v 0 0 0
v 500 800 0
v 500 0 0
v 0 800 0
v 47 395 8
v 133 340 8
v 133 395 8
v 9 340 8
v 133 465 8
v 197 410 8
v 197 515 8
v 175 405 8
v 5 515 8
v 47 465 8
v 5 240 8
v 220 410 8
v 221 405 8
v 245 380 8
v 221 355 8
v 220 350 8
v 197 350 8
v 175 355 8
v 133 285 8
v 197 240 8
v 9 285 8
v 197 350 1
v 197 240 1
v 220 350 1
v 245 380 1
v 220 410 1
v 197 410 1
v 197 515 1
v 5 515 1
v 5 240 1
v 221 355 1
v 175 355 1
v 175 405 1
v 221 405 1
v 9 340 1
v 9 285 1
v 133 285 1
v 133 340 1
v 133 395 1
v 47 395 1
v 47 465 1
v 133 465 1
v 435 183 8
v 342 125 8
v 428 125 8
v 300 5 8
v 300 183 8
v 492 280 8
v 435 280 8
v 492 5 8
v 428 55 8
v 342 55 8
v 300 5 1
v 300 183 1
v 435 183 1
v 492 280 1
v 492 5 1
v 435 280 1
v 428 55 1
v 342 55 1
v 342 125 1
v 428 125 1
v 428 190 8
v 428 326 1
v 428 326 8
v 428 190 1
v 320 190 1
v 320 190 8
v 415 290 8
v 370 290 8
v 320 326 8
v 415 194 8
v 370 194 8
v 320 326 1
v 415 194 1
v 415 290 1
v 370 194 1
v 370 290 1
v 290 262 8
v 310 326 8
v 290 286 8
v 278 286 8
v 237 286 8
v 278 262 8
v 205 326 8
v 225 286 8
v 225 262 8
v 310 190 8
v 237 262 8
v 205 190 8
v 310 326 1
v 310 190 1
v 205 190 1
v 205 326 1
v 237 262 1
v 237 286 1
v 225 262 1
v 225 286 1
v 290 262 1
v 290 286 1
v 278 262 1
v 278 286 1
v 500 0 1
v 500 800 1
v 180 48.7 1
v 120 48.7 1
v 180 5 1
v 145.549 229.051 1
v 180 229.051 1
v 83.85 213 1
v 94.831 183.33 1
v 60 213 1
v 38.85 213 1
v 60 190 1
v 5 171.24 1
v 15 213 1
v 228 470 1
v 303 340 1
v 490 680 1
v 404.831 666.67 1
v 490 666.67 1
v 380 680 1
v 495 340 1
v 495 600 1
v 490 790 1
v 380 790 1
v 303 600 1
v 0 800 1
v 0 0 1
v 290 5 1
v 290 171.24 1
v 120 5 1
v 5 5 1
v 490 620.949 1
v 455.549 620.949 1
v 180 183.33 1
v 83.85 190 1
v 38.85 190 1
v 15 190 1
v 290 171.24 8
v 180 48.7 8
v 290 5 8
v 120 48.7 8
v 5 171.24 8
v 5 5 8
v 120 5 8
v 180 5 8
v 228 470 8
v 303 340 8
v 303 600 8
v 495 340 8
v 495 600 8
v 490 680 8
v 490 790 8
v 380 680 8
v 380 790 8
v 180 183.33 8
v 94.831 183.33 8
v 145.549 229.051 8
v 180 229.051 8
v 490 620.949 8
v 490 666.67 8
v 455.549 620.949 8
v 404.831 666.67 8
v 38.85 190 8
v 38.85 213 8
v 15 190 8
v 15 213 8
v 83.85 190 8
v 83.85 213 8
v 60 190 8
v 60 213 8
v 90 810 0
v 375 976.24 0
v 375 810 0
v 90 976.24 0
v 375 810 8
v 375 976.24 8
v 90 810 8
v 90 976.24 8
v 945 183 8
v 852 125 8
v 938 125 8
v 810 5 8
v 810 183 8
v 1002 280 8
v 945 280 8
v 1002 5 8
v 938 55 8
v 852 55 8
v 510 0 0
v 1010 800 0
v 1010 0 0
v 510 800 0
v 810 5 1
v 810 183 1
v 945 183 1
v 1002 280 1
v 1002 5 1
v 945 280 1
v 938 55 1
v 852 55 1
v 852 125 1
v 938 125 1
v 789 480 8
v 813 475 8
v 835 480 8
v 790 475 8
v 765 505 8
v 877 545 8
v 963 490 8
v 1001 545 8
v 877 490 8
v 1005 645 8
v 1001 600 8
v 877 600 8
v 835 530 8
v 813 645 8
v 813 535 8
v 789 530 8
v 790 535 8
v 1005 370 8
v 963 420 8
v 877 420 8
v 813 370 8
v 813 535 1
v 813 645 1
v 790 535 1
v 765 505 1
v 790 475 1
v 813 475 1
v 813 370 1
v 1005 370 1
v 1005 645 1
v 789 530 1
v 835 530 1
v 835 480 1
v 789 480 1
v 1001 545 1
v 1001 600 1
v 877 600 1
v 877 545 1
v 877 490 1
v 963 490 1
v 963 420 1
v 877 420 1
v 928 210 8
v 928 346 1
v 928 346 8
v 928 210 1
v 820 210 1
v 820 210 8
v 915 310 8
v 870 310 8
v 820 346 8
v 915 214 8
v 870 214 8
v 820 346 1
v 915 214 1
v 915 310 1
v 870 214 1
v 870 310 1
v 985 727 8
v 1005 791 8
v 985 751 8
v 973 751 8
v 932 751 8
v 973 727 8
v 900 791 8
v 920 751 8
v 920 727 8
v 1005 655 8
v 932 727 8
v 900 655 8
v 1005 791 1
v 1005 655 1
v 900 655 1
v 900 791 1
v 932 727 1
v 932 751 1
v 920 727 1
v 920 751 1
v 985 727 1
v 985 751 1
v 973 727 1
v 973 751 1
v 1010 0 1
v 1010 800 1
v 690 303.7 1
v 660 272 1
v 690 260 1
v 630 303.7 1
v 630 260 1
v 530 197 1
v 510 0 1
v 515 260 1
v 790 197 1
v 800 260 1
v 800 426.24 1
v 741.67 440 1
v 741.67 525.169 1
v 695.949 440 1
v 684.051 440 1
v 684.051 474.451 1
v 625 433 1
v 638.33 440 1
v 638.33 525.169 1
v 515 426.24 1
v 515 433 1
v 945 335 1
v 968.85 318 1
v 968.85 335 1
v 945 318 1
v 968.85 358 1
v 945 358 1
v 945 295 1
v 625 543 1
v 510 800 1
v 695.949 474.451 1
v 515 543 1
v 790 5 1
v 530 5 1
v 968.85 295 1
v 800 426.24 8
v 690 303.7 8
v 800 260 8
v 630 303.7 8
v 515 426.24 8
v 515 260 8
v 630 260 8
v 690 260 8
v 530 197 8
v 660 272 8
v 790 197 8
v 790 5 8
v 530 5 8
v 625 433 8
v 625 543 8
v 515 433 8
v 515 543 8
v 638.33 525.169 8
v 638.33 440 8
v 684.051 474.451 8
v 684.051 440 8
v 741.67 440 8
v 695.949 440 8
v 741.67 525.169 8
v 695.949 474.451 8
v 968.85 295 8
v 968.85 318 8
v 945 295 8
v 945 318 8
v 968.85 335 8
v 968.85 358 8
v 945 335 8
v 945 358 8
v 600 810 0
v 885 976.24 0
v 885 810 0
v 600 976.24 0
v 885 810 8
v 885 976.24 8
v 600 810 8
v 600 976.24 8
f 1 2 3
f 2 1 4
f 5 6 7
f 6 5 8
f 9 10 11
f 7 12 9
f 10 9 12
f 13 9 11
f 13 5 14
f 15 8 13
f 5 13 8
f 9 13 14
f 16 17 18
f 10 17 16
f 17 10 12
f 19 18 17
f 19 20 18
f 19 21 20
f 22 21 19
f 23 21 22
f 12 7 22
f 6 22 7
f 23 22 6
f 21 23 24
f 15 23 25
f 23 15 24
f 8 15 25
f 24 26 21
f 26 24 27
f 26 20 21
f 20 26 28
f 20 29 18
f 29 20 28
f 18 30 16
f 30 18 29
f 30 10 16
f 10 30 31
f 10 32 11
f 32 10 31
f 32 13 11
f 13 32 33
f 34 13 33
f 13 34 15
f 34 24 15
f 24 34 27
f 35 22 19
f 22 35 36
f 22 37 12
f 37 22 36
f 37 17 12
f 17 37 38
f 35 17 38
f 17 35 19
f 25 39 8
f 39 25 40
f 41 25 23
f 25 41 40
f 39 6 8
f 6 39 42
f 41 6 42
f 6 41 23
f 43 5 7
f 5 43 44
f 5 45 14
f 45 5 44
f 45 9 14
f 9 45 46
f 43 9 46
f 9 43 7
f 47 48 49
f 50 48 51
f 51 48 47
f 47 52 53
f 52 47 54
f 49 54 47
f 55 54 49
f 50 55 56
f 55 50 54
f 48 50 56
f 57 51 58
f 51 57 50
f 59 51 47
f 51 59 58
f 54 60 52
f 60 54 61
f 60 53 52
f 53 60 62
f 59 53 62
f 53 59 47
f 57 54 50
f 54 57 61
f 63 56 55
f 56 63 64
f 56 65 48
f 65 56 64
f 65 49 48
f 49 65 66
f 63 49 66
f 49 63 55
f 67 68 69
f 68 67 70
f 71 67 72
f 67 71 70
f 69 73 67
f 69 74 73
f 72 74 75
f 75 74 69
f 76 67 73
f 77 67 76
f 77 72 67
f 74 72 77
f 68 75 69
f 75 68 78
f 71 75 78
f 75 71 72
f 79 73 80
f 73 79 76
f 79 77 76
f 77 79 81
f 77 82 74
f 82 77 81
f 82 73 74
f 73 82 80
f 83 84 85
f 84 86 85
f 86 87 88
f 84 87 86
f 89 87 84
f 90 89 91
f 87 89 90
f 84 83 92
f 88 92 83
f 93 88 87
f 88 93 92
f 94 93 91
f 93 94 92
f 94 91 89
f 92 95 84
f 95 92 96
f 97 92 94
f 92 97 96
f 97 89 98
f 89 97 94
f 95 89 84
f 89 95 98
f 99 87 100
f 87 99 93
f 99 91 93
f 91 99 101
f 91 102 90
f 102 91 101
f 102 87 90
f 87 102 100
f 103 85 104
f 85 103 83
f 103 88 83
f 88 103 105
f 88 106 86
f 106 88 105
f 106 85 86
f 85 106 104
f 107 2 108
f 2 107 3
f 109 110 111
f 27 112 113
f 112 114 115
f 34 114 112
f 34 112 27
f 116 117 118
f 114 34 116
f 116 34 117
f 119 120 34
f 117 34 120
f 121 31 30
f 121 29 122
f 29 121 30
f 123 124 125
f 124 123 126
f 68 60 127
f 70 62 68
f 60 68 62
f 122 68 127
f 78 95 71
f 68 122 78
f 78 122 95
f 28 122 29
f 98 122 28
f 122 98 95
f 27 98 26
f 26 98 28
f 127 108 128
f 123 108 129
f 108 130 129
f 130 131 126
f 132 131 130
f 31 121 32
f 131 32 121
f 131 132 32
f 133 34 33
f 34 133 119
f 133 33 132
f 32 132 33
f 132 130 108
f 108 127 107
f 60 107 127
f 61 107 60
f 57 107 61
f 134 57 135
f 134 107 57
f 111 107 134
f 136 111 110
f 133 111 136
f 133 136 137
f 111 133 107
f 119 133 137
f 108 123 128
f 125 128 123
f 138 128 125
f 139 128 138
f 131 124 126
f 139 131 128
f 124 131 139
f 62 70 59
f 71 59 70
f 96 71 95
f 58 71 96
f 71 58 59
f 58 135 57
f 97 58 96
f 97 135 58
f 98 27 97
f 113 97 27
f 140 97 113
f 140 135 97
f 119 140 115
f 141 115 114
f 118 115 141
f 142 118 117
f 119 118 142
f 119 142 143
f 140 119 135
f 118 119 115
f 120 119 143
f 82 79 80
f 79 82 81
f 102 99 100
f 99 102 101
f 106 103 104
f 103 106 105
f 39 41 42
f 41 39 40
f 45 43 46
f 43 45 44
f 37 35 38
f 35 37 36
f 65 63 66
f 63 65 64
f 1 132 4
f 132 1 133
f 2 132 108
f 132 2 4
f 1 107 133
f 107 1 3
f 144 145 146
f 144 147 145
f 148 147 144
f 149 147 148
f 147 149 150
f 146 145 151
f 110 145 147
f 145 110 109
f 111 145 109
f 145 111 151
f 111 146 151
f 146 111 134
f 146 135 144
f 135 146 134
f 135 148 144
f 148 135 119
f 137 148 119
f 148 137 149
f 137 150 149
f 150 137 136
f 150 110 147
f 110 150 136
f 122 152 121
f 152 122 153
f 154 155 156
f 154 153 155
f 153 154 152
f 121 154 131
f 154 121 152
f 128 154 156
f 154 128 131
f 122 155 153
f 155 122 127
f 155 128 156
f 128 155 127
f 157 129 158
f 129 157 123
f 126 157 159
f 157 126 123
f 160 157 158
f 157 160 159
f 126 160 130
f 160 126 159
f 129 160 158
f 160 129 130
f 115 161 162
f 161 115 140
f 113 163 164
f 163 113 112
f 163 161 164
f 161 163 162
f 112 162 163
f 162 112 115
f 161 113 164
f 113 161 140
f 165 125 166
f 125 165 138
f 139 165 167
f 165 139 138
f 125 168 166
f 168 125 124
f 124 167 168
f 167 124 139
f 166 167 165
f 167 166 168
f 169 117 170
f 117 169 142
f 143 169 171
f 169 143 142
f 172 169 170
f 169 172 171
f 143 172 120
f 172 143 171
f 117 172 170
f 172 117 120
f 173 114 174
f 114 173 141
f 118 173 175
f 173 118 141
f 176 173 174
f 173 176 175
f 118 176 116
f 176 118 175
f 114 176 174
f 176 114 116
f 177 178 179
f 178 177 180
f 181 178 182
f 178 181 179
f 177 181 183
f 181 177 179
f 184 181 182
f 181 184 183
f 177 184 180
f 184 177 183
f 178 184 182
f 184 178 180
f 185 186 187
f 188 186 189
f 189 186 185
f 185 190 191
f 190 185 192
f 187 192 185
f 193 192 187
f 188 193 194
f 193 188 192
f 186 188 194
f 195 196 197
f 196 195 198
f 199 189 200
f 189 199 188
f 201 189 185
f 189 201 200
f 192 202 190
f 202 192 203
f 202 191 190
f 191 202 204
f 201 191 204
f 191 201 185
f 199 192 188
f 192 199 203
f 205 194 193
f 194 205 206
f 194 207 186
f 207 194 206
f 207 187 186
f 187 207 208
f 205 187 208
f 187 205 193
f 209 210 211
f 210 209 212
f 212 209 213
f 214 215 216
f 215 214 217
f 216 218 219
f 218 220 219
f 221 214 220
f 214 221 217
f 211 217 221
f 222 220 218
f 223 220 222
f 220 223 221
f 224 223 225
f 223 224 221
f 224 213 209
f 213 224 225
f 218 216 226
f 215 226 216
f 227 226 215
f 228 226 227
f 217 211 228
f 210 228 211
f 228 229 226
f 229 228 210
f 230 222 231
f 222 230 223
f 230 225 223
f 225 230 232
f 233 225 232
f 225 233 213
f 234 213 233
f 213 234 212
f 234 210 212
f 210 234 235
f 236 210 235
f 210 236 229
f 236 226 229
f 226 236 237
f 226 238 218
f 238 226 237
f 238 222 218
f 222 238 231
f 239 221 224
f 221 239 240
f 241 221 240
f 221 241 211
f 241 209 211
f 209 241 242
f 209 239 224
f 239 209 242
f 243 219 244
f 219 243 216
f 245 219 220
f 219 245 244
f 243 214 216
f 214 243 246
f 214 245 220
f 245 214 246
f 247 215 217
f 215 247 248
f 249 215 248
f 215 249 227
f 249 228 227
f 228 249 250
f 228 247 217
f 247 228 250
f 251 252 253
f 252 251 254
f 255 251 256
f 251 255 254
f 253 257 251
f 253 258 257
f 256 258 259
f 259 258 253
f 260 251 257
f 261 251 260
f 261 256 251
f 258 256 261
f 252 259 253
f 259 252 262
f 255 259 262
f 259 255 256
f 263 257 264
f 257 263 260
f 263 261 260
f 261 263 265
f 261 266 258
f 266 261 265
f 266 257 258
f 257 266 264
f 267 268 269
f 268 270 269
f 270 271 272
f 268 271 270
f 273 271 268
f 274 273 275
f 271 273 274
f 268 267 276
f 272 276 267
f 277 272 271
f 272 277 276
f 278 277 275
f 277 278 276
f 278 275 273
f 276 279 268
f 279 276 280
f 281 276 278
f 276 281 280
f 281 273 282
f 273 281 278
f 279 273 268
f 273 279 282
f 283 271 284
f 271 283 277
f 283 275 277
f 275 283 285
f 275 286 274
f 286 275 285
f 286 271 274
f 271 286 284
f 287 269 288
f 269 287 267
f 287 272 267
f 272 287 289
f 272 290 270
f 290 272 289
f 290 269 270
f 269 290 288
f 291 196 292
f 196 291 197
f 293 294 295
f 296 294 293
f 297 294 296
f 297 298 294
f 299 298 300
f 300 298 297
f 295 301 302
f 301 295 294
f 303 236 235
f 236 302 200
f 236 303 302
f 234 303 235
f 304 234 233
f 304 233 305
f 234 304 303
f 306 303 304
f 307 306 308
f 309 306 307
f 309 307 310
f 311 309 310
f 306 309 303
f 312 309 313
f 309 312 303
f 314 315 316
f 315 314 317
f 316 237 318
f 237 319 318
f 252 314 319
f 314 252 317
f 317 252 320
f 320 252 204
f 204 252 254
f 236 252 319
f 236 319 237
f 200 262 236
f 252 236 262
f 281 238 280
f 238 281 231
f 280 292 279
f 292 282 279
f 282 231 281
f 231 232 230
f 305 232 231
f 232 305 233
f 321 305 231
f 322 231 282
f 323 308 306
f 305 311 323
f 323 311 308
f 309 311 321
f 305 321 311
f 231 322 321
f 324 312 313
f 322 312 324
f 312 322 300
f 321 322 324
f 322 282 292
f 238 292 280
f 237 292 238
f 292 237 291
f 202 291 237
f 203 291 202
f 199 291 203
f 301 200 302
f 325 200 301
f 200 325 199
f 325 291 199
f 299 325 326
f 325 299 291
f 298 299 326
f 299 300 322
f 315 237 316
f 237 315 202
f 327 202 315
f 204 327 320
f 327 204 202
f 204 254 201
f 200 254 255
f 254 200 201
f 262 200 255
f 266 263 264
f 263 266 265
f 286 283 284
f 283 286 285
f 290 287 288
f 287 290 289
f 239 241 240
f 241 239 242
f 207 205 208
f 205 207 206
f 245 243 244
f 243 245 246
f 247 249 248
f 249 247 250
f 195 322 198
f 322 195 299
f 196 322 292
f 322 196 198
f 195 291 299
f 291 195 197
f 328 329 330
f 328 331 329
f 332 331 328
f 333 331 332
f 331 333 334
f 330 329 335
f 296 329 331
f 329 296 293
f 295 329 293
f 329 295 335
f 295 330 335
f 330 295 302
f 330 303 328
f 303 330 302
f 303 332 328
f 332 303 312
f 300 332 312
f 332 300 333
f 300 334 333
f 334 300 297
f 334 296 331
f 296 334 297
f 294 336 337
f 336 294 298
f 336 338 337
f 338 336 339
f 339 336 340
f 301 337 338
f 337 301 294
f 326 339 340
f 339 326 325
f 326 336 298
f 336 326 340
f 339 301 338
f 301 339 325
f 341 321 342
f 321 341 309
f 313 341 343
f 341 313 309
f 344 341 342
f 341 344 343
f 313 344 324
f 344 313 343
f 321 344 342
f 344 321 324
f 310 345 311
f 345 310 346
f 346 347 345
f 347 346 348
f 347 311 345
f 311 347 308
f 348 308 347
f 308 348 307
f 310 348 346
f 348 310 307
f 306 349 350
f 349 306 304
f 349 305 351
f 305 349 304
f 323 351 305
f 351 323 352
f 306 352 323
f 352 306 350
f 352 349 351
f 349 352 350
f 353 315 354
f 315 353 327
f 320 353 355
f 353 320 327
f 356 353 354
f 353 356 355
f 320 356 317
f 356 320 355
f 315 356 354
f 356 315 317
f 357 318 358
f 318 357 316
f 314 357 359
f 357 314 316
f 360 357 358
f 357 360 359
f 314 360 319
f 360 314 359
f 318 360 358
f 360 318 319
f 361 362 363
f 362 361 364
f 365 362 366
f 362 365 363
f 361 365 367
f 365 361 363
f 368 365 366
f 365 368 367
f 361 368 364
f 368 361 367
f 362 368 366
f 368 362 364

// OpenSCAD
// file: bergingdak.scad
/*
 * Blueprint: Dak berging
 * description: 
 */
module bergingdak()
{
	difference() {
		union() {
		color("black") { linear_extrude(height=8) { polygon( [ 
			[0, 0],
			[110, 0],
			[110, 110],
			[0, 110]
		] ); } } 

		} // union


	} // difference
} // END OF: Dak berging
// file: dakkapel_zijkant.scad
/*
 * Blueprint: Dakkapel zijkant
 * description: 
 */
module dakkapelzijkant()
{
	difference() {
		union() {
		color("royalblue") { linear_extrude(height=8) { polygon( [ 
			[0, 0],
			[23.85, 0],
			[23.85, 23],
			[0, 23]
		] ); } } 

		} // union


	} // difference
} // END OF: Dakkapel zijkant
// file: dakkapeldak.scad
/*
 * Blueprint: Dak achter
 * description: 
 */
module dakkapeldak()
{
	difference() {
		union() {
		color("black") { linear_extrude(height=8) { polygon( [ 
			[39.0512, 0],
			[39.0512, 34.4508],
			[-6.67, 85.1691],
			[-6.67, 0]
		] ); } } 

		} // union


	} // difference
} // END OF: Dak achter
// file: dakachter.scad
/*
 * Blueprint: Dak achter
 * description: 
 */
module dakachter()
{
	difference() {
		union() {
		color("black") { linear_extrude(height=8) { polygon( [ 
			[-10, 0],
			[275, 0],
			[275, 166.24],
			[-10, 166.24]
		] ); } } 

		} // union


	} // difference
} // END OF: Dak achter
// file: dakvoor.scad
/*
 * Blueprint: Dak voorkant
 * description: 
 */
module dakvoor()
{
	difference() {
		union() {
		color("black") { linear_extrude(height=8) { polygon( [ 
			[-10, 0],
			[105, 0],
			[105, 43.7],
			[165, 43.7],
			[165, 0],
			[275, 0],
			[275, 166.24],
			[-10, 166.24]
		] ); } } 

		} // union


	} // difference
} // END OF: Dak voorkant
// file: achterkant.scad
/*
 * Blueprint: Achterkant
 * description: 
 */
module achter()
{
	difference() {
		union() {
		color("royalblue") { linear_extrude(height=8) { polygon( [ 
			[225, 128],
			[229.308, 144],
			[150.692, 144],
			[155, 128]
		] ); } } 

		color("royalblue") { linear_extrude(height=3) { polygon( [ 
			[97, 0],
			[105, 0],
			[105, 136],
			[97, 136]
		] ); } } 

		color("royalblue") { linear_extrude(height=8) { polygon( [ 
			[155, 32],
			[225, 32],
			[225, 42],
			[155, 42]
		] ); } } 

		color("darkred") { linear_extrude(height=8) { polygon( [ 
			[97, 135],
			[97, 0],
			[275, 0],
			[275, 192],
			[0, 192],
			[0, 135]
		] ); } } 

		} // union
		color("white") { linear_extrude(height=8) { polygon( [ 
			[155, 42],
			[225, 42],
			[225, 128],
			[155, 128]
		] ); } } 

		color("royalblue") { linear_extrude(height=8) { polygon( [ 
			[159, 99],
			[221, 99],
			[221, 124],
			[159, 124]
		] ); } } 

		color("royalblue") { linear_extrude(height=8) { polygon( [ 
			[159, 47],
			[221, 47],
			[221, 94],
			[159, 94]
		] ); } } 



	} // difference
} // END OF: Achterkant
// file: bergingzijkant.scad
/*
 * Blueprint: Berging zijkant
 * description: 
 */
module berging_zijkant()
{
	difference() {
		union() {
		color("royalblue") { linear_extrude(height=8) { polygon( [ 
			[100, 0],
			[108, 0],
			[108, 136],
			[100, 136]
		] ); } } 

		color("darkred") { linear_extrude(height=8) { polygon( [ 
			[0, 0],
			[108, 0],
			[108, 136],
			[0, 136]
		] ); } } 

		} // union
		color("royalblue") { linear_extrude(height=8) { polygon( [ 
			[50, 4],
			[95, 4],
			[95, 100],
			[50, 100]
		] ); } } 



	} // difference
} // END OF: Berging zijkant
// file: bergingachterkant.scad
/*
 * Blueprint: Achterkant van de berging
 * description: 
 */
module bergingachter()
{
	difference() {
		union() {
		color("royalblue") { linear_extrude(height=8) { polygon( [ 
			[20, 96],
			[32, 96],
			[32, 104],
			[20, 104]
		] ); } } 

		color("royalblue") { linear_extrude(height=8) { polygon( [ 
			[73, 96],
			[85, 96],
			[85, 104],
			[73, 104]
		] ); } } 

		color("darkred") { linear_extrude(height=8) { polygon( [ 
			[0, 0],
			[105, 0],
			[105, 136],
			[0, 136]
		] ); } } 

		} // union
		color("royalblue") { linear_extrude(height=8) { polygon( [ 
			[20, 72],
			[32, 72],
			[32, 96],
			[20, 96]
		] ); } } 

		color("royalblue") { linear_extrude(height=8) { polygon( [ 
			[73, 72],
			[85, 72],
			[85, 96],
			[73, 96]
		] ); } } 



	} // difference
} // END OF: Achterkant van de berging
// file: grondoppervlak.scad
/*
 * Blueprint: Floor
 * description: 
 */
module oppervlak()
{
	difference() {
		union() {
		color("royalblue") { linear_extrude(height=3) { polygon( [ 
			[223, 260],
			[267, 260],
			[267, 352],
			[223, 352]
		] ); } } 

		color("royalblue") { linear_extrude(height=3) { polygon( [ 
			[178, 260],
			[218, 260],
			[218, 312],
			[178, 312]
		] ); } } 

		color("royalblue") { linear_extrude(height=3) { polygon( [ 
			[8, 133],
			[165, 133],
			[165, 252],
			[8, 252]
		] ); } } 

		color("royalblue") { linear_extrude(height=2) { polygon( [ 
			[0, 0],
			[275, 0],
			[275, 360],
			[170, 360],
			[170, 260],
			[0, 260]
		] ); } } 

		color("royalblue") { linear_extrude(height=3) { polygon( [ 
			[170, 8],
			[267, 8],
			[267, 128],
			[170, 128]
		] ); } } 

		color("royalblue") { linear_extrude(height=3) { polygon( [ 
			[170, 133],
			[267, 133],
			[267, 252],
			[170, 252]
		] ); } } 

		color("royalblue") { linear_extrude(height=3) { polygon( [ 
			[178, 317],
			[218, 317],
			[218, 352],
			[178, 352]
		] ); } } 

		color("royalblue") { linear_extrude(height=3) { polygon( [ 
			[8, 8],
			[165, 8],
			[165, 128],
			[8, 128]
		] ); } } 

		} // union


	} // difference
} // END OF: Floor
// file: zijkant_buiten.scad
/*
 * Blueprint: Zijkant buiten
 * description: 
 */
module buiten()
{
	difference() {
		union() {
		color("darkred") { linear_extrude(height=8) { polygon( [ 
			[260, 0],
			[260, 135],
			[260, 192],
			[130, 267],
			[0, 192],
			[0, 0]
		] ); } } 

		} // union


	} // difference
} // END OF: Zijkant buiten
// file: zijkant_binnen.scad
/*
 * Blueprint: Zijkant binnen
 * description: 
 */
module binnen()
{
	difference() {
		union() {
		} // union
		color("royalblue") { linear_extrude(height=8) { polygon( [ 
			[360, 0],
			[360, 136],
			[260, 136],
			[260, 192],
			[130, 267],
			[0, 192],
			[0, 0]
		] ); } } 



	} // difference
} // END OF: Zijkant binnen
// file: voorkant.scad
/*
 * Blueprint: Front
 * description: 
 */
module front()
{
	difference() {
		union() {
		color("royalblue") { linear_extrude(height=8) { polygon( [ 
			[110, 160],
			[160, 160],
			[160, 170],
			[110, 170]
		] ); } } 

		color("royalblue") { linear_extrude(height=8) { polygon( [ 
			[230, 128],
			[234, 144],
			[171, 144],
			[175, 128]
		] ); } } 

		color("royalblue") { linear_extrude(height=8) { polygon( [ 
			[120, 128],
			[124.308, 144],
			[45.6923, 144],
			[50, 128]
		] ); } } 

		color("royalblue") { linear_extrude(height=8) { polygon( [ 
			[50, 32],
			[120, 32],
			[120, 42],
			[50, 42]
		] ); } } 

		color("darkred") { linear_extrude(height=8) { polygon( [ 
			[0, 0],
			[275, 0],
			[275, 192],
			[165, 192],
			[165, 215],
			[135, 240],
			[105, 215],
			[105, 192],
			[0, 192]
		] ); } } 

		} // union
		color("royalblue") { linear_extrude(height=8) { polygon( [ 
			[110, 170],
			[160, 170],
			[160, 216],
			[110, 216]
		] ); } } 

		color("white") { linear_extrude(height=8) { polygon( [ 
			[114, 174],
			[156, 174],
			[156, 212],
			[114, 212]
		] ); } } 

		color("royalblue") { linear_extrude(height=8) { polygon( [ 
			[180, 4],
			[225, 4],
			[225, 94],
			[180, 94]
		] ); } } 

		color("royalblue") { linear_extrude(height=8) { polygon( [ 
			[175, 4],
			[230, 4],
			[230, 128],
			[175, 128]
		] ); } } 

		color("white") { linear_extrude(height=8) { polygon( [ 
			[180, 99],
			[225, 99],
			[225, 124],
			[180, 124]
		] ); } } 

		color("white") { linear_extrude(height=8) { polygon( [ 
			[50, 42],
			[120, 42],
			[120, 128],
			[50, 128]
		] ); } } 

		color("royalblue") { linear_extrude(height=8) { polygon( [ 
			[54, 99],
			[116, 99],
			[116, 124],
			[54, 124]
		] ); } } 

		color("royalblue") { linear_extrude(height=8) { polygon( [ 
			[54, 47],
			[116, 47],
			[116, 94],
			[54, 94]
		] ); } } 



	} // difference
} // END OF: Front
// main file
include <voorkant.scad>
include <zijkant_binnen.scad>
include <zijkant_buiten.scad>
include <grondoppervlak.scad>
include <bergingachterkant.scad>
include <bergingzijkant.scad>
include <achterkant.scad>
include <dakvoor.scad>
include <dakachter.scad>
include <dakkapeldak.scad>
include <dakkapel_zijkant.scad>
include <bergingdak.scad>

module poging1()
{
  cube([500,800,1]);

  // translate([0,0,0]) rotate([0,0,0])
  translate([5,5,0]) rotate([0,0,0]) front();
  translate([295,280,0]) rotate([0,0,-90]) achter();
  translate([5,795,8]) rotate([0,180,180]) binnen();
  translate([325,625,0]) rotate([0,0,-90]) dakvoor();
  translate([420,210,0]) rotate([0,0,90]) berging_zijkant();
  translate([380,650,0]) rotate([0,0,0]) bergingachter();
  translate([5,510,0]) rotate([0,0,-90]) buiten();

  translate([270,220,0]) rotate([0,0,90]) dakkapeldak(); // cube([0.1, 67.2385, 10]);
  translate([5,530,8]) rotate([0,180,270]) dakkapeldak(); //
  translate([5,192+17,0]) dakkapelzijkant();
  translate([45,192+17,0]) dakkapelzijkant();

  // translate([235,460,0]) bergingdak();
  // translate([15,250,0]) rotate([0,0,0]) dakachter();

}

module bestepogingtotnutoe()
{
  cube([500,800,1]);

  // translate([0,0,0]) rotate([0,0,0])
  translate([495,370,0]) rotate([0,0,90]) front();
  translate([300,280,0]) rotate([0,0,-90]) achter();
  translate([25,795,8]) rotate([0,180,180]) binnen();
  translate([15,260,0]) rotate([0,0,0]) dakvoor();
  translate([310,210,0]) rotate([0,0,00]) berging_zijkant();
  translate([390,655,0]) rotate([0,0,0]) bergingachter();
  translate([20,5,0]) rotate([0,0,0]) buiten();
  translate([5,433,0]) bergingdak();

  translate([135,440,0]) rotate([0,0,0]) dakkapeldak(); // cube([0.1, 67.2385, 10]);
  translate([225,440,8]) rotate([0,180,0]) dakkapeldak(); //
  translate([435,295,0]) dakkapelzijkant();
  translate([435,335,0]) dakkapelzijkant();

  translate([100,810,0]) rotate([0,0,0]) dakachter();

}

module poging2()
{
  cube([500,800,1]);

  // translate([0,0,0]) rotate([0,0,0])
  translate([5,515,0]) rotate([0,0,-90]) front();
  translate([300,280,0]) rotate([0,0,-90]) achter();
  translate([5,795,8]) rotate([0,180,180]) binnen();
  translate([15,5,0]) rotate([0,0,0]) dakvoor();
  translate([320,190,0]) rotate([0,0,0]) berging_zijkant();
  translate([205,190,0]) rotate([0,0,0]) bergingachter();
  translate([495,340,0]) rotate([0,0,90]) buiten();
  translate([380,680,0]) bergingdak();

  translate([180,190,0]) rotate([0,0,90]) dakkapeldak(); // cube([0.1, 67.2385, 10]);
  translate([490,660,8]) rotate([0,180,90]) dakkapeldak(); //
  translate([15,190,0]) dakkapelzijkant();
  translate([60,190,0]) dakkapelzijkant();

  translate([100,810,0]) rotate([0,0,0]) dakachter();

}

poging2();
translate([510,0,0]) bestepogingtotnutoe();
